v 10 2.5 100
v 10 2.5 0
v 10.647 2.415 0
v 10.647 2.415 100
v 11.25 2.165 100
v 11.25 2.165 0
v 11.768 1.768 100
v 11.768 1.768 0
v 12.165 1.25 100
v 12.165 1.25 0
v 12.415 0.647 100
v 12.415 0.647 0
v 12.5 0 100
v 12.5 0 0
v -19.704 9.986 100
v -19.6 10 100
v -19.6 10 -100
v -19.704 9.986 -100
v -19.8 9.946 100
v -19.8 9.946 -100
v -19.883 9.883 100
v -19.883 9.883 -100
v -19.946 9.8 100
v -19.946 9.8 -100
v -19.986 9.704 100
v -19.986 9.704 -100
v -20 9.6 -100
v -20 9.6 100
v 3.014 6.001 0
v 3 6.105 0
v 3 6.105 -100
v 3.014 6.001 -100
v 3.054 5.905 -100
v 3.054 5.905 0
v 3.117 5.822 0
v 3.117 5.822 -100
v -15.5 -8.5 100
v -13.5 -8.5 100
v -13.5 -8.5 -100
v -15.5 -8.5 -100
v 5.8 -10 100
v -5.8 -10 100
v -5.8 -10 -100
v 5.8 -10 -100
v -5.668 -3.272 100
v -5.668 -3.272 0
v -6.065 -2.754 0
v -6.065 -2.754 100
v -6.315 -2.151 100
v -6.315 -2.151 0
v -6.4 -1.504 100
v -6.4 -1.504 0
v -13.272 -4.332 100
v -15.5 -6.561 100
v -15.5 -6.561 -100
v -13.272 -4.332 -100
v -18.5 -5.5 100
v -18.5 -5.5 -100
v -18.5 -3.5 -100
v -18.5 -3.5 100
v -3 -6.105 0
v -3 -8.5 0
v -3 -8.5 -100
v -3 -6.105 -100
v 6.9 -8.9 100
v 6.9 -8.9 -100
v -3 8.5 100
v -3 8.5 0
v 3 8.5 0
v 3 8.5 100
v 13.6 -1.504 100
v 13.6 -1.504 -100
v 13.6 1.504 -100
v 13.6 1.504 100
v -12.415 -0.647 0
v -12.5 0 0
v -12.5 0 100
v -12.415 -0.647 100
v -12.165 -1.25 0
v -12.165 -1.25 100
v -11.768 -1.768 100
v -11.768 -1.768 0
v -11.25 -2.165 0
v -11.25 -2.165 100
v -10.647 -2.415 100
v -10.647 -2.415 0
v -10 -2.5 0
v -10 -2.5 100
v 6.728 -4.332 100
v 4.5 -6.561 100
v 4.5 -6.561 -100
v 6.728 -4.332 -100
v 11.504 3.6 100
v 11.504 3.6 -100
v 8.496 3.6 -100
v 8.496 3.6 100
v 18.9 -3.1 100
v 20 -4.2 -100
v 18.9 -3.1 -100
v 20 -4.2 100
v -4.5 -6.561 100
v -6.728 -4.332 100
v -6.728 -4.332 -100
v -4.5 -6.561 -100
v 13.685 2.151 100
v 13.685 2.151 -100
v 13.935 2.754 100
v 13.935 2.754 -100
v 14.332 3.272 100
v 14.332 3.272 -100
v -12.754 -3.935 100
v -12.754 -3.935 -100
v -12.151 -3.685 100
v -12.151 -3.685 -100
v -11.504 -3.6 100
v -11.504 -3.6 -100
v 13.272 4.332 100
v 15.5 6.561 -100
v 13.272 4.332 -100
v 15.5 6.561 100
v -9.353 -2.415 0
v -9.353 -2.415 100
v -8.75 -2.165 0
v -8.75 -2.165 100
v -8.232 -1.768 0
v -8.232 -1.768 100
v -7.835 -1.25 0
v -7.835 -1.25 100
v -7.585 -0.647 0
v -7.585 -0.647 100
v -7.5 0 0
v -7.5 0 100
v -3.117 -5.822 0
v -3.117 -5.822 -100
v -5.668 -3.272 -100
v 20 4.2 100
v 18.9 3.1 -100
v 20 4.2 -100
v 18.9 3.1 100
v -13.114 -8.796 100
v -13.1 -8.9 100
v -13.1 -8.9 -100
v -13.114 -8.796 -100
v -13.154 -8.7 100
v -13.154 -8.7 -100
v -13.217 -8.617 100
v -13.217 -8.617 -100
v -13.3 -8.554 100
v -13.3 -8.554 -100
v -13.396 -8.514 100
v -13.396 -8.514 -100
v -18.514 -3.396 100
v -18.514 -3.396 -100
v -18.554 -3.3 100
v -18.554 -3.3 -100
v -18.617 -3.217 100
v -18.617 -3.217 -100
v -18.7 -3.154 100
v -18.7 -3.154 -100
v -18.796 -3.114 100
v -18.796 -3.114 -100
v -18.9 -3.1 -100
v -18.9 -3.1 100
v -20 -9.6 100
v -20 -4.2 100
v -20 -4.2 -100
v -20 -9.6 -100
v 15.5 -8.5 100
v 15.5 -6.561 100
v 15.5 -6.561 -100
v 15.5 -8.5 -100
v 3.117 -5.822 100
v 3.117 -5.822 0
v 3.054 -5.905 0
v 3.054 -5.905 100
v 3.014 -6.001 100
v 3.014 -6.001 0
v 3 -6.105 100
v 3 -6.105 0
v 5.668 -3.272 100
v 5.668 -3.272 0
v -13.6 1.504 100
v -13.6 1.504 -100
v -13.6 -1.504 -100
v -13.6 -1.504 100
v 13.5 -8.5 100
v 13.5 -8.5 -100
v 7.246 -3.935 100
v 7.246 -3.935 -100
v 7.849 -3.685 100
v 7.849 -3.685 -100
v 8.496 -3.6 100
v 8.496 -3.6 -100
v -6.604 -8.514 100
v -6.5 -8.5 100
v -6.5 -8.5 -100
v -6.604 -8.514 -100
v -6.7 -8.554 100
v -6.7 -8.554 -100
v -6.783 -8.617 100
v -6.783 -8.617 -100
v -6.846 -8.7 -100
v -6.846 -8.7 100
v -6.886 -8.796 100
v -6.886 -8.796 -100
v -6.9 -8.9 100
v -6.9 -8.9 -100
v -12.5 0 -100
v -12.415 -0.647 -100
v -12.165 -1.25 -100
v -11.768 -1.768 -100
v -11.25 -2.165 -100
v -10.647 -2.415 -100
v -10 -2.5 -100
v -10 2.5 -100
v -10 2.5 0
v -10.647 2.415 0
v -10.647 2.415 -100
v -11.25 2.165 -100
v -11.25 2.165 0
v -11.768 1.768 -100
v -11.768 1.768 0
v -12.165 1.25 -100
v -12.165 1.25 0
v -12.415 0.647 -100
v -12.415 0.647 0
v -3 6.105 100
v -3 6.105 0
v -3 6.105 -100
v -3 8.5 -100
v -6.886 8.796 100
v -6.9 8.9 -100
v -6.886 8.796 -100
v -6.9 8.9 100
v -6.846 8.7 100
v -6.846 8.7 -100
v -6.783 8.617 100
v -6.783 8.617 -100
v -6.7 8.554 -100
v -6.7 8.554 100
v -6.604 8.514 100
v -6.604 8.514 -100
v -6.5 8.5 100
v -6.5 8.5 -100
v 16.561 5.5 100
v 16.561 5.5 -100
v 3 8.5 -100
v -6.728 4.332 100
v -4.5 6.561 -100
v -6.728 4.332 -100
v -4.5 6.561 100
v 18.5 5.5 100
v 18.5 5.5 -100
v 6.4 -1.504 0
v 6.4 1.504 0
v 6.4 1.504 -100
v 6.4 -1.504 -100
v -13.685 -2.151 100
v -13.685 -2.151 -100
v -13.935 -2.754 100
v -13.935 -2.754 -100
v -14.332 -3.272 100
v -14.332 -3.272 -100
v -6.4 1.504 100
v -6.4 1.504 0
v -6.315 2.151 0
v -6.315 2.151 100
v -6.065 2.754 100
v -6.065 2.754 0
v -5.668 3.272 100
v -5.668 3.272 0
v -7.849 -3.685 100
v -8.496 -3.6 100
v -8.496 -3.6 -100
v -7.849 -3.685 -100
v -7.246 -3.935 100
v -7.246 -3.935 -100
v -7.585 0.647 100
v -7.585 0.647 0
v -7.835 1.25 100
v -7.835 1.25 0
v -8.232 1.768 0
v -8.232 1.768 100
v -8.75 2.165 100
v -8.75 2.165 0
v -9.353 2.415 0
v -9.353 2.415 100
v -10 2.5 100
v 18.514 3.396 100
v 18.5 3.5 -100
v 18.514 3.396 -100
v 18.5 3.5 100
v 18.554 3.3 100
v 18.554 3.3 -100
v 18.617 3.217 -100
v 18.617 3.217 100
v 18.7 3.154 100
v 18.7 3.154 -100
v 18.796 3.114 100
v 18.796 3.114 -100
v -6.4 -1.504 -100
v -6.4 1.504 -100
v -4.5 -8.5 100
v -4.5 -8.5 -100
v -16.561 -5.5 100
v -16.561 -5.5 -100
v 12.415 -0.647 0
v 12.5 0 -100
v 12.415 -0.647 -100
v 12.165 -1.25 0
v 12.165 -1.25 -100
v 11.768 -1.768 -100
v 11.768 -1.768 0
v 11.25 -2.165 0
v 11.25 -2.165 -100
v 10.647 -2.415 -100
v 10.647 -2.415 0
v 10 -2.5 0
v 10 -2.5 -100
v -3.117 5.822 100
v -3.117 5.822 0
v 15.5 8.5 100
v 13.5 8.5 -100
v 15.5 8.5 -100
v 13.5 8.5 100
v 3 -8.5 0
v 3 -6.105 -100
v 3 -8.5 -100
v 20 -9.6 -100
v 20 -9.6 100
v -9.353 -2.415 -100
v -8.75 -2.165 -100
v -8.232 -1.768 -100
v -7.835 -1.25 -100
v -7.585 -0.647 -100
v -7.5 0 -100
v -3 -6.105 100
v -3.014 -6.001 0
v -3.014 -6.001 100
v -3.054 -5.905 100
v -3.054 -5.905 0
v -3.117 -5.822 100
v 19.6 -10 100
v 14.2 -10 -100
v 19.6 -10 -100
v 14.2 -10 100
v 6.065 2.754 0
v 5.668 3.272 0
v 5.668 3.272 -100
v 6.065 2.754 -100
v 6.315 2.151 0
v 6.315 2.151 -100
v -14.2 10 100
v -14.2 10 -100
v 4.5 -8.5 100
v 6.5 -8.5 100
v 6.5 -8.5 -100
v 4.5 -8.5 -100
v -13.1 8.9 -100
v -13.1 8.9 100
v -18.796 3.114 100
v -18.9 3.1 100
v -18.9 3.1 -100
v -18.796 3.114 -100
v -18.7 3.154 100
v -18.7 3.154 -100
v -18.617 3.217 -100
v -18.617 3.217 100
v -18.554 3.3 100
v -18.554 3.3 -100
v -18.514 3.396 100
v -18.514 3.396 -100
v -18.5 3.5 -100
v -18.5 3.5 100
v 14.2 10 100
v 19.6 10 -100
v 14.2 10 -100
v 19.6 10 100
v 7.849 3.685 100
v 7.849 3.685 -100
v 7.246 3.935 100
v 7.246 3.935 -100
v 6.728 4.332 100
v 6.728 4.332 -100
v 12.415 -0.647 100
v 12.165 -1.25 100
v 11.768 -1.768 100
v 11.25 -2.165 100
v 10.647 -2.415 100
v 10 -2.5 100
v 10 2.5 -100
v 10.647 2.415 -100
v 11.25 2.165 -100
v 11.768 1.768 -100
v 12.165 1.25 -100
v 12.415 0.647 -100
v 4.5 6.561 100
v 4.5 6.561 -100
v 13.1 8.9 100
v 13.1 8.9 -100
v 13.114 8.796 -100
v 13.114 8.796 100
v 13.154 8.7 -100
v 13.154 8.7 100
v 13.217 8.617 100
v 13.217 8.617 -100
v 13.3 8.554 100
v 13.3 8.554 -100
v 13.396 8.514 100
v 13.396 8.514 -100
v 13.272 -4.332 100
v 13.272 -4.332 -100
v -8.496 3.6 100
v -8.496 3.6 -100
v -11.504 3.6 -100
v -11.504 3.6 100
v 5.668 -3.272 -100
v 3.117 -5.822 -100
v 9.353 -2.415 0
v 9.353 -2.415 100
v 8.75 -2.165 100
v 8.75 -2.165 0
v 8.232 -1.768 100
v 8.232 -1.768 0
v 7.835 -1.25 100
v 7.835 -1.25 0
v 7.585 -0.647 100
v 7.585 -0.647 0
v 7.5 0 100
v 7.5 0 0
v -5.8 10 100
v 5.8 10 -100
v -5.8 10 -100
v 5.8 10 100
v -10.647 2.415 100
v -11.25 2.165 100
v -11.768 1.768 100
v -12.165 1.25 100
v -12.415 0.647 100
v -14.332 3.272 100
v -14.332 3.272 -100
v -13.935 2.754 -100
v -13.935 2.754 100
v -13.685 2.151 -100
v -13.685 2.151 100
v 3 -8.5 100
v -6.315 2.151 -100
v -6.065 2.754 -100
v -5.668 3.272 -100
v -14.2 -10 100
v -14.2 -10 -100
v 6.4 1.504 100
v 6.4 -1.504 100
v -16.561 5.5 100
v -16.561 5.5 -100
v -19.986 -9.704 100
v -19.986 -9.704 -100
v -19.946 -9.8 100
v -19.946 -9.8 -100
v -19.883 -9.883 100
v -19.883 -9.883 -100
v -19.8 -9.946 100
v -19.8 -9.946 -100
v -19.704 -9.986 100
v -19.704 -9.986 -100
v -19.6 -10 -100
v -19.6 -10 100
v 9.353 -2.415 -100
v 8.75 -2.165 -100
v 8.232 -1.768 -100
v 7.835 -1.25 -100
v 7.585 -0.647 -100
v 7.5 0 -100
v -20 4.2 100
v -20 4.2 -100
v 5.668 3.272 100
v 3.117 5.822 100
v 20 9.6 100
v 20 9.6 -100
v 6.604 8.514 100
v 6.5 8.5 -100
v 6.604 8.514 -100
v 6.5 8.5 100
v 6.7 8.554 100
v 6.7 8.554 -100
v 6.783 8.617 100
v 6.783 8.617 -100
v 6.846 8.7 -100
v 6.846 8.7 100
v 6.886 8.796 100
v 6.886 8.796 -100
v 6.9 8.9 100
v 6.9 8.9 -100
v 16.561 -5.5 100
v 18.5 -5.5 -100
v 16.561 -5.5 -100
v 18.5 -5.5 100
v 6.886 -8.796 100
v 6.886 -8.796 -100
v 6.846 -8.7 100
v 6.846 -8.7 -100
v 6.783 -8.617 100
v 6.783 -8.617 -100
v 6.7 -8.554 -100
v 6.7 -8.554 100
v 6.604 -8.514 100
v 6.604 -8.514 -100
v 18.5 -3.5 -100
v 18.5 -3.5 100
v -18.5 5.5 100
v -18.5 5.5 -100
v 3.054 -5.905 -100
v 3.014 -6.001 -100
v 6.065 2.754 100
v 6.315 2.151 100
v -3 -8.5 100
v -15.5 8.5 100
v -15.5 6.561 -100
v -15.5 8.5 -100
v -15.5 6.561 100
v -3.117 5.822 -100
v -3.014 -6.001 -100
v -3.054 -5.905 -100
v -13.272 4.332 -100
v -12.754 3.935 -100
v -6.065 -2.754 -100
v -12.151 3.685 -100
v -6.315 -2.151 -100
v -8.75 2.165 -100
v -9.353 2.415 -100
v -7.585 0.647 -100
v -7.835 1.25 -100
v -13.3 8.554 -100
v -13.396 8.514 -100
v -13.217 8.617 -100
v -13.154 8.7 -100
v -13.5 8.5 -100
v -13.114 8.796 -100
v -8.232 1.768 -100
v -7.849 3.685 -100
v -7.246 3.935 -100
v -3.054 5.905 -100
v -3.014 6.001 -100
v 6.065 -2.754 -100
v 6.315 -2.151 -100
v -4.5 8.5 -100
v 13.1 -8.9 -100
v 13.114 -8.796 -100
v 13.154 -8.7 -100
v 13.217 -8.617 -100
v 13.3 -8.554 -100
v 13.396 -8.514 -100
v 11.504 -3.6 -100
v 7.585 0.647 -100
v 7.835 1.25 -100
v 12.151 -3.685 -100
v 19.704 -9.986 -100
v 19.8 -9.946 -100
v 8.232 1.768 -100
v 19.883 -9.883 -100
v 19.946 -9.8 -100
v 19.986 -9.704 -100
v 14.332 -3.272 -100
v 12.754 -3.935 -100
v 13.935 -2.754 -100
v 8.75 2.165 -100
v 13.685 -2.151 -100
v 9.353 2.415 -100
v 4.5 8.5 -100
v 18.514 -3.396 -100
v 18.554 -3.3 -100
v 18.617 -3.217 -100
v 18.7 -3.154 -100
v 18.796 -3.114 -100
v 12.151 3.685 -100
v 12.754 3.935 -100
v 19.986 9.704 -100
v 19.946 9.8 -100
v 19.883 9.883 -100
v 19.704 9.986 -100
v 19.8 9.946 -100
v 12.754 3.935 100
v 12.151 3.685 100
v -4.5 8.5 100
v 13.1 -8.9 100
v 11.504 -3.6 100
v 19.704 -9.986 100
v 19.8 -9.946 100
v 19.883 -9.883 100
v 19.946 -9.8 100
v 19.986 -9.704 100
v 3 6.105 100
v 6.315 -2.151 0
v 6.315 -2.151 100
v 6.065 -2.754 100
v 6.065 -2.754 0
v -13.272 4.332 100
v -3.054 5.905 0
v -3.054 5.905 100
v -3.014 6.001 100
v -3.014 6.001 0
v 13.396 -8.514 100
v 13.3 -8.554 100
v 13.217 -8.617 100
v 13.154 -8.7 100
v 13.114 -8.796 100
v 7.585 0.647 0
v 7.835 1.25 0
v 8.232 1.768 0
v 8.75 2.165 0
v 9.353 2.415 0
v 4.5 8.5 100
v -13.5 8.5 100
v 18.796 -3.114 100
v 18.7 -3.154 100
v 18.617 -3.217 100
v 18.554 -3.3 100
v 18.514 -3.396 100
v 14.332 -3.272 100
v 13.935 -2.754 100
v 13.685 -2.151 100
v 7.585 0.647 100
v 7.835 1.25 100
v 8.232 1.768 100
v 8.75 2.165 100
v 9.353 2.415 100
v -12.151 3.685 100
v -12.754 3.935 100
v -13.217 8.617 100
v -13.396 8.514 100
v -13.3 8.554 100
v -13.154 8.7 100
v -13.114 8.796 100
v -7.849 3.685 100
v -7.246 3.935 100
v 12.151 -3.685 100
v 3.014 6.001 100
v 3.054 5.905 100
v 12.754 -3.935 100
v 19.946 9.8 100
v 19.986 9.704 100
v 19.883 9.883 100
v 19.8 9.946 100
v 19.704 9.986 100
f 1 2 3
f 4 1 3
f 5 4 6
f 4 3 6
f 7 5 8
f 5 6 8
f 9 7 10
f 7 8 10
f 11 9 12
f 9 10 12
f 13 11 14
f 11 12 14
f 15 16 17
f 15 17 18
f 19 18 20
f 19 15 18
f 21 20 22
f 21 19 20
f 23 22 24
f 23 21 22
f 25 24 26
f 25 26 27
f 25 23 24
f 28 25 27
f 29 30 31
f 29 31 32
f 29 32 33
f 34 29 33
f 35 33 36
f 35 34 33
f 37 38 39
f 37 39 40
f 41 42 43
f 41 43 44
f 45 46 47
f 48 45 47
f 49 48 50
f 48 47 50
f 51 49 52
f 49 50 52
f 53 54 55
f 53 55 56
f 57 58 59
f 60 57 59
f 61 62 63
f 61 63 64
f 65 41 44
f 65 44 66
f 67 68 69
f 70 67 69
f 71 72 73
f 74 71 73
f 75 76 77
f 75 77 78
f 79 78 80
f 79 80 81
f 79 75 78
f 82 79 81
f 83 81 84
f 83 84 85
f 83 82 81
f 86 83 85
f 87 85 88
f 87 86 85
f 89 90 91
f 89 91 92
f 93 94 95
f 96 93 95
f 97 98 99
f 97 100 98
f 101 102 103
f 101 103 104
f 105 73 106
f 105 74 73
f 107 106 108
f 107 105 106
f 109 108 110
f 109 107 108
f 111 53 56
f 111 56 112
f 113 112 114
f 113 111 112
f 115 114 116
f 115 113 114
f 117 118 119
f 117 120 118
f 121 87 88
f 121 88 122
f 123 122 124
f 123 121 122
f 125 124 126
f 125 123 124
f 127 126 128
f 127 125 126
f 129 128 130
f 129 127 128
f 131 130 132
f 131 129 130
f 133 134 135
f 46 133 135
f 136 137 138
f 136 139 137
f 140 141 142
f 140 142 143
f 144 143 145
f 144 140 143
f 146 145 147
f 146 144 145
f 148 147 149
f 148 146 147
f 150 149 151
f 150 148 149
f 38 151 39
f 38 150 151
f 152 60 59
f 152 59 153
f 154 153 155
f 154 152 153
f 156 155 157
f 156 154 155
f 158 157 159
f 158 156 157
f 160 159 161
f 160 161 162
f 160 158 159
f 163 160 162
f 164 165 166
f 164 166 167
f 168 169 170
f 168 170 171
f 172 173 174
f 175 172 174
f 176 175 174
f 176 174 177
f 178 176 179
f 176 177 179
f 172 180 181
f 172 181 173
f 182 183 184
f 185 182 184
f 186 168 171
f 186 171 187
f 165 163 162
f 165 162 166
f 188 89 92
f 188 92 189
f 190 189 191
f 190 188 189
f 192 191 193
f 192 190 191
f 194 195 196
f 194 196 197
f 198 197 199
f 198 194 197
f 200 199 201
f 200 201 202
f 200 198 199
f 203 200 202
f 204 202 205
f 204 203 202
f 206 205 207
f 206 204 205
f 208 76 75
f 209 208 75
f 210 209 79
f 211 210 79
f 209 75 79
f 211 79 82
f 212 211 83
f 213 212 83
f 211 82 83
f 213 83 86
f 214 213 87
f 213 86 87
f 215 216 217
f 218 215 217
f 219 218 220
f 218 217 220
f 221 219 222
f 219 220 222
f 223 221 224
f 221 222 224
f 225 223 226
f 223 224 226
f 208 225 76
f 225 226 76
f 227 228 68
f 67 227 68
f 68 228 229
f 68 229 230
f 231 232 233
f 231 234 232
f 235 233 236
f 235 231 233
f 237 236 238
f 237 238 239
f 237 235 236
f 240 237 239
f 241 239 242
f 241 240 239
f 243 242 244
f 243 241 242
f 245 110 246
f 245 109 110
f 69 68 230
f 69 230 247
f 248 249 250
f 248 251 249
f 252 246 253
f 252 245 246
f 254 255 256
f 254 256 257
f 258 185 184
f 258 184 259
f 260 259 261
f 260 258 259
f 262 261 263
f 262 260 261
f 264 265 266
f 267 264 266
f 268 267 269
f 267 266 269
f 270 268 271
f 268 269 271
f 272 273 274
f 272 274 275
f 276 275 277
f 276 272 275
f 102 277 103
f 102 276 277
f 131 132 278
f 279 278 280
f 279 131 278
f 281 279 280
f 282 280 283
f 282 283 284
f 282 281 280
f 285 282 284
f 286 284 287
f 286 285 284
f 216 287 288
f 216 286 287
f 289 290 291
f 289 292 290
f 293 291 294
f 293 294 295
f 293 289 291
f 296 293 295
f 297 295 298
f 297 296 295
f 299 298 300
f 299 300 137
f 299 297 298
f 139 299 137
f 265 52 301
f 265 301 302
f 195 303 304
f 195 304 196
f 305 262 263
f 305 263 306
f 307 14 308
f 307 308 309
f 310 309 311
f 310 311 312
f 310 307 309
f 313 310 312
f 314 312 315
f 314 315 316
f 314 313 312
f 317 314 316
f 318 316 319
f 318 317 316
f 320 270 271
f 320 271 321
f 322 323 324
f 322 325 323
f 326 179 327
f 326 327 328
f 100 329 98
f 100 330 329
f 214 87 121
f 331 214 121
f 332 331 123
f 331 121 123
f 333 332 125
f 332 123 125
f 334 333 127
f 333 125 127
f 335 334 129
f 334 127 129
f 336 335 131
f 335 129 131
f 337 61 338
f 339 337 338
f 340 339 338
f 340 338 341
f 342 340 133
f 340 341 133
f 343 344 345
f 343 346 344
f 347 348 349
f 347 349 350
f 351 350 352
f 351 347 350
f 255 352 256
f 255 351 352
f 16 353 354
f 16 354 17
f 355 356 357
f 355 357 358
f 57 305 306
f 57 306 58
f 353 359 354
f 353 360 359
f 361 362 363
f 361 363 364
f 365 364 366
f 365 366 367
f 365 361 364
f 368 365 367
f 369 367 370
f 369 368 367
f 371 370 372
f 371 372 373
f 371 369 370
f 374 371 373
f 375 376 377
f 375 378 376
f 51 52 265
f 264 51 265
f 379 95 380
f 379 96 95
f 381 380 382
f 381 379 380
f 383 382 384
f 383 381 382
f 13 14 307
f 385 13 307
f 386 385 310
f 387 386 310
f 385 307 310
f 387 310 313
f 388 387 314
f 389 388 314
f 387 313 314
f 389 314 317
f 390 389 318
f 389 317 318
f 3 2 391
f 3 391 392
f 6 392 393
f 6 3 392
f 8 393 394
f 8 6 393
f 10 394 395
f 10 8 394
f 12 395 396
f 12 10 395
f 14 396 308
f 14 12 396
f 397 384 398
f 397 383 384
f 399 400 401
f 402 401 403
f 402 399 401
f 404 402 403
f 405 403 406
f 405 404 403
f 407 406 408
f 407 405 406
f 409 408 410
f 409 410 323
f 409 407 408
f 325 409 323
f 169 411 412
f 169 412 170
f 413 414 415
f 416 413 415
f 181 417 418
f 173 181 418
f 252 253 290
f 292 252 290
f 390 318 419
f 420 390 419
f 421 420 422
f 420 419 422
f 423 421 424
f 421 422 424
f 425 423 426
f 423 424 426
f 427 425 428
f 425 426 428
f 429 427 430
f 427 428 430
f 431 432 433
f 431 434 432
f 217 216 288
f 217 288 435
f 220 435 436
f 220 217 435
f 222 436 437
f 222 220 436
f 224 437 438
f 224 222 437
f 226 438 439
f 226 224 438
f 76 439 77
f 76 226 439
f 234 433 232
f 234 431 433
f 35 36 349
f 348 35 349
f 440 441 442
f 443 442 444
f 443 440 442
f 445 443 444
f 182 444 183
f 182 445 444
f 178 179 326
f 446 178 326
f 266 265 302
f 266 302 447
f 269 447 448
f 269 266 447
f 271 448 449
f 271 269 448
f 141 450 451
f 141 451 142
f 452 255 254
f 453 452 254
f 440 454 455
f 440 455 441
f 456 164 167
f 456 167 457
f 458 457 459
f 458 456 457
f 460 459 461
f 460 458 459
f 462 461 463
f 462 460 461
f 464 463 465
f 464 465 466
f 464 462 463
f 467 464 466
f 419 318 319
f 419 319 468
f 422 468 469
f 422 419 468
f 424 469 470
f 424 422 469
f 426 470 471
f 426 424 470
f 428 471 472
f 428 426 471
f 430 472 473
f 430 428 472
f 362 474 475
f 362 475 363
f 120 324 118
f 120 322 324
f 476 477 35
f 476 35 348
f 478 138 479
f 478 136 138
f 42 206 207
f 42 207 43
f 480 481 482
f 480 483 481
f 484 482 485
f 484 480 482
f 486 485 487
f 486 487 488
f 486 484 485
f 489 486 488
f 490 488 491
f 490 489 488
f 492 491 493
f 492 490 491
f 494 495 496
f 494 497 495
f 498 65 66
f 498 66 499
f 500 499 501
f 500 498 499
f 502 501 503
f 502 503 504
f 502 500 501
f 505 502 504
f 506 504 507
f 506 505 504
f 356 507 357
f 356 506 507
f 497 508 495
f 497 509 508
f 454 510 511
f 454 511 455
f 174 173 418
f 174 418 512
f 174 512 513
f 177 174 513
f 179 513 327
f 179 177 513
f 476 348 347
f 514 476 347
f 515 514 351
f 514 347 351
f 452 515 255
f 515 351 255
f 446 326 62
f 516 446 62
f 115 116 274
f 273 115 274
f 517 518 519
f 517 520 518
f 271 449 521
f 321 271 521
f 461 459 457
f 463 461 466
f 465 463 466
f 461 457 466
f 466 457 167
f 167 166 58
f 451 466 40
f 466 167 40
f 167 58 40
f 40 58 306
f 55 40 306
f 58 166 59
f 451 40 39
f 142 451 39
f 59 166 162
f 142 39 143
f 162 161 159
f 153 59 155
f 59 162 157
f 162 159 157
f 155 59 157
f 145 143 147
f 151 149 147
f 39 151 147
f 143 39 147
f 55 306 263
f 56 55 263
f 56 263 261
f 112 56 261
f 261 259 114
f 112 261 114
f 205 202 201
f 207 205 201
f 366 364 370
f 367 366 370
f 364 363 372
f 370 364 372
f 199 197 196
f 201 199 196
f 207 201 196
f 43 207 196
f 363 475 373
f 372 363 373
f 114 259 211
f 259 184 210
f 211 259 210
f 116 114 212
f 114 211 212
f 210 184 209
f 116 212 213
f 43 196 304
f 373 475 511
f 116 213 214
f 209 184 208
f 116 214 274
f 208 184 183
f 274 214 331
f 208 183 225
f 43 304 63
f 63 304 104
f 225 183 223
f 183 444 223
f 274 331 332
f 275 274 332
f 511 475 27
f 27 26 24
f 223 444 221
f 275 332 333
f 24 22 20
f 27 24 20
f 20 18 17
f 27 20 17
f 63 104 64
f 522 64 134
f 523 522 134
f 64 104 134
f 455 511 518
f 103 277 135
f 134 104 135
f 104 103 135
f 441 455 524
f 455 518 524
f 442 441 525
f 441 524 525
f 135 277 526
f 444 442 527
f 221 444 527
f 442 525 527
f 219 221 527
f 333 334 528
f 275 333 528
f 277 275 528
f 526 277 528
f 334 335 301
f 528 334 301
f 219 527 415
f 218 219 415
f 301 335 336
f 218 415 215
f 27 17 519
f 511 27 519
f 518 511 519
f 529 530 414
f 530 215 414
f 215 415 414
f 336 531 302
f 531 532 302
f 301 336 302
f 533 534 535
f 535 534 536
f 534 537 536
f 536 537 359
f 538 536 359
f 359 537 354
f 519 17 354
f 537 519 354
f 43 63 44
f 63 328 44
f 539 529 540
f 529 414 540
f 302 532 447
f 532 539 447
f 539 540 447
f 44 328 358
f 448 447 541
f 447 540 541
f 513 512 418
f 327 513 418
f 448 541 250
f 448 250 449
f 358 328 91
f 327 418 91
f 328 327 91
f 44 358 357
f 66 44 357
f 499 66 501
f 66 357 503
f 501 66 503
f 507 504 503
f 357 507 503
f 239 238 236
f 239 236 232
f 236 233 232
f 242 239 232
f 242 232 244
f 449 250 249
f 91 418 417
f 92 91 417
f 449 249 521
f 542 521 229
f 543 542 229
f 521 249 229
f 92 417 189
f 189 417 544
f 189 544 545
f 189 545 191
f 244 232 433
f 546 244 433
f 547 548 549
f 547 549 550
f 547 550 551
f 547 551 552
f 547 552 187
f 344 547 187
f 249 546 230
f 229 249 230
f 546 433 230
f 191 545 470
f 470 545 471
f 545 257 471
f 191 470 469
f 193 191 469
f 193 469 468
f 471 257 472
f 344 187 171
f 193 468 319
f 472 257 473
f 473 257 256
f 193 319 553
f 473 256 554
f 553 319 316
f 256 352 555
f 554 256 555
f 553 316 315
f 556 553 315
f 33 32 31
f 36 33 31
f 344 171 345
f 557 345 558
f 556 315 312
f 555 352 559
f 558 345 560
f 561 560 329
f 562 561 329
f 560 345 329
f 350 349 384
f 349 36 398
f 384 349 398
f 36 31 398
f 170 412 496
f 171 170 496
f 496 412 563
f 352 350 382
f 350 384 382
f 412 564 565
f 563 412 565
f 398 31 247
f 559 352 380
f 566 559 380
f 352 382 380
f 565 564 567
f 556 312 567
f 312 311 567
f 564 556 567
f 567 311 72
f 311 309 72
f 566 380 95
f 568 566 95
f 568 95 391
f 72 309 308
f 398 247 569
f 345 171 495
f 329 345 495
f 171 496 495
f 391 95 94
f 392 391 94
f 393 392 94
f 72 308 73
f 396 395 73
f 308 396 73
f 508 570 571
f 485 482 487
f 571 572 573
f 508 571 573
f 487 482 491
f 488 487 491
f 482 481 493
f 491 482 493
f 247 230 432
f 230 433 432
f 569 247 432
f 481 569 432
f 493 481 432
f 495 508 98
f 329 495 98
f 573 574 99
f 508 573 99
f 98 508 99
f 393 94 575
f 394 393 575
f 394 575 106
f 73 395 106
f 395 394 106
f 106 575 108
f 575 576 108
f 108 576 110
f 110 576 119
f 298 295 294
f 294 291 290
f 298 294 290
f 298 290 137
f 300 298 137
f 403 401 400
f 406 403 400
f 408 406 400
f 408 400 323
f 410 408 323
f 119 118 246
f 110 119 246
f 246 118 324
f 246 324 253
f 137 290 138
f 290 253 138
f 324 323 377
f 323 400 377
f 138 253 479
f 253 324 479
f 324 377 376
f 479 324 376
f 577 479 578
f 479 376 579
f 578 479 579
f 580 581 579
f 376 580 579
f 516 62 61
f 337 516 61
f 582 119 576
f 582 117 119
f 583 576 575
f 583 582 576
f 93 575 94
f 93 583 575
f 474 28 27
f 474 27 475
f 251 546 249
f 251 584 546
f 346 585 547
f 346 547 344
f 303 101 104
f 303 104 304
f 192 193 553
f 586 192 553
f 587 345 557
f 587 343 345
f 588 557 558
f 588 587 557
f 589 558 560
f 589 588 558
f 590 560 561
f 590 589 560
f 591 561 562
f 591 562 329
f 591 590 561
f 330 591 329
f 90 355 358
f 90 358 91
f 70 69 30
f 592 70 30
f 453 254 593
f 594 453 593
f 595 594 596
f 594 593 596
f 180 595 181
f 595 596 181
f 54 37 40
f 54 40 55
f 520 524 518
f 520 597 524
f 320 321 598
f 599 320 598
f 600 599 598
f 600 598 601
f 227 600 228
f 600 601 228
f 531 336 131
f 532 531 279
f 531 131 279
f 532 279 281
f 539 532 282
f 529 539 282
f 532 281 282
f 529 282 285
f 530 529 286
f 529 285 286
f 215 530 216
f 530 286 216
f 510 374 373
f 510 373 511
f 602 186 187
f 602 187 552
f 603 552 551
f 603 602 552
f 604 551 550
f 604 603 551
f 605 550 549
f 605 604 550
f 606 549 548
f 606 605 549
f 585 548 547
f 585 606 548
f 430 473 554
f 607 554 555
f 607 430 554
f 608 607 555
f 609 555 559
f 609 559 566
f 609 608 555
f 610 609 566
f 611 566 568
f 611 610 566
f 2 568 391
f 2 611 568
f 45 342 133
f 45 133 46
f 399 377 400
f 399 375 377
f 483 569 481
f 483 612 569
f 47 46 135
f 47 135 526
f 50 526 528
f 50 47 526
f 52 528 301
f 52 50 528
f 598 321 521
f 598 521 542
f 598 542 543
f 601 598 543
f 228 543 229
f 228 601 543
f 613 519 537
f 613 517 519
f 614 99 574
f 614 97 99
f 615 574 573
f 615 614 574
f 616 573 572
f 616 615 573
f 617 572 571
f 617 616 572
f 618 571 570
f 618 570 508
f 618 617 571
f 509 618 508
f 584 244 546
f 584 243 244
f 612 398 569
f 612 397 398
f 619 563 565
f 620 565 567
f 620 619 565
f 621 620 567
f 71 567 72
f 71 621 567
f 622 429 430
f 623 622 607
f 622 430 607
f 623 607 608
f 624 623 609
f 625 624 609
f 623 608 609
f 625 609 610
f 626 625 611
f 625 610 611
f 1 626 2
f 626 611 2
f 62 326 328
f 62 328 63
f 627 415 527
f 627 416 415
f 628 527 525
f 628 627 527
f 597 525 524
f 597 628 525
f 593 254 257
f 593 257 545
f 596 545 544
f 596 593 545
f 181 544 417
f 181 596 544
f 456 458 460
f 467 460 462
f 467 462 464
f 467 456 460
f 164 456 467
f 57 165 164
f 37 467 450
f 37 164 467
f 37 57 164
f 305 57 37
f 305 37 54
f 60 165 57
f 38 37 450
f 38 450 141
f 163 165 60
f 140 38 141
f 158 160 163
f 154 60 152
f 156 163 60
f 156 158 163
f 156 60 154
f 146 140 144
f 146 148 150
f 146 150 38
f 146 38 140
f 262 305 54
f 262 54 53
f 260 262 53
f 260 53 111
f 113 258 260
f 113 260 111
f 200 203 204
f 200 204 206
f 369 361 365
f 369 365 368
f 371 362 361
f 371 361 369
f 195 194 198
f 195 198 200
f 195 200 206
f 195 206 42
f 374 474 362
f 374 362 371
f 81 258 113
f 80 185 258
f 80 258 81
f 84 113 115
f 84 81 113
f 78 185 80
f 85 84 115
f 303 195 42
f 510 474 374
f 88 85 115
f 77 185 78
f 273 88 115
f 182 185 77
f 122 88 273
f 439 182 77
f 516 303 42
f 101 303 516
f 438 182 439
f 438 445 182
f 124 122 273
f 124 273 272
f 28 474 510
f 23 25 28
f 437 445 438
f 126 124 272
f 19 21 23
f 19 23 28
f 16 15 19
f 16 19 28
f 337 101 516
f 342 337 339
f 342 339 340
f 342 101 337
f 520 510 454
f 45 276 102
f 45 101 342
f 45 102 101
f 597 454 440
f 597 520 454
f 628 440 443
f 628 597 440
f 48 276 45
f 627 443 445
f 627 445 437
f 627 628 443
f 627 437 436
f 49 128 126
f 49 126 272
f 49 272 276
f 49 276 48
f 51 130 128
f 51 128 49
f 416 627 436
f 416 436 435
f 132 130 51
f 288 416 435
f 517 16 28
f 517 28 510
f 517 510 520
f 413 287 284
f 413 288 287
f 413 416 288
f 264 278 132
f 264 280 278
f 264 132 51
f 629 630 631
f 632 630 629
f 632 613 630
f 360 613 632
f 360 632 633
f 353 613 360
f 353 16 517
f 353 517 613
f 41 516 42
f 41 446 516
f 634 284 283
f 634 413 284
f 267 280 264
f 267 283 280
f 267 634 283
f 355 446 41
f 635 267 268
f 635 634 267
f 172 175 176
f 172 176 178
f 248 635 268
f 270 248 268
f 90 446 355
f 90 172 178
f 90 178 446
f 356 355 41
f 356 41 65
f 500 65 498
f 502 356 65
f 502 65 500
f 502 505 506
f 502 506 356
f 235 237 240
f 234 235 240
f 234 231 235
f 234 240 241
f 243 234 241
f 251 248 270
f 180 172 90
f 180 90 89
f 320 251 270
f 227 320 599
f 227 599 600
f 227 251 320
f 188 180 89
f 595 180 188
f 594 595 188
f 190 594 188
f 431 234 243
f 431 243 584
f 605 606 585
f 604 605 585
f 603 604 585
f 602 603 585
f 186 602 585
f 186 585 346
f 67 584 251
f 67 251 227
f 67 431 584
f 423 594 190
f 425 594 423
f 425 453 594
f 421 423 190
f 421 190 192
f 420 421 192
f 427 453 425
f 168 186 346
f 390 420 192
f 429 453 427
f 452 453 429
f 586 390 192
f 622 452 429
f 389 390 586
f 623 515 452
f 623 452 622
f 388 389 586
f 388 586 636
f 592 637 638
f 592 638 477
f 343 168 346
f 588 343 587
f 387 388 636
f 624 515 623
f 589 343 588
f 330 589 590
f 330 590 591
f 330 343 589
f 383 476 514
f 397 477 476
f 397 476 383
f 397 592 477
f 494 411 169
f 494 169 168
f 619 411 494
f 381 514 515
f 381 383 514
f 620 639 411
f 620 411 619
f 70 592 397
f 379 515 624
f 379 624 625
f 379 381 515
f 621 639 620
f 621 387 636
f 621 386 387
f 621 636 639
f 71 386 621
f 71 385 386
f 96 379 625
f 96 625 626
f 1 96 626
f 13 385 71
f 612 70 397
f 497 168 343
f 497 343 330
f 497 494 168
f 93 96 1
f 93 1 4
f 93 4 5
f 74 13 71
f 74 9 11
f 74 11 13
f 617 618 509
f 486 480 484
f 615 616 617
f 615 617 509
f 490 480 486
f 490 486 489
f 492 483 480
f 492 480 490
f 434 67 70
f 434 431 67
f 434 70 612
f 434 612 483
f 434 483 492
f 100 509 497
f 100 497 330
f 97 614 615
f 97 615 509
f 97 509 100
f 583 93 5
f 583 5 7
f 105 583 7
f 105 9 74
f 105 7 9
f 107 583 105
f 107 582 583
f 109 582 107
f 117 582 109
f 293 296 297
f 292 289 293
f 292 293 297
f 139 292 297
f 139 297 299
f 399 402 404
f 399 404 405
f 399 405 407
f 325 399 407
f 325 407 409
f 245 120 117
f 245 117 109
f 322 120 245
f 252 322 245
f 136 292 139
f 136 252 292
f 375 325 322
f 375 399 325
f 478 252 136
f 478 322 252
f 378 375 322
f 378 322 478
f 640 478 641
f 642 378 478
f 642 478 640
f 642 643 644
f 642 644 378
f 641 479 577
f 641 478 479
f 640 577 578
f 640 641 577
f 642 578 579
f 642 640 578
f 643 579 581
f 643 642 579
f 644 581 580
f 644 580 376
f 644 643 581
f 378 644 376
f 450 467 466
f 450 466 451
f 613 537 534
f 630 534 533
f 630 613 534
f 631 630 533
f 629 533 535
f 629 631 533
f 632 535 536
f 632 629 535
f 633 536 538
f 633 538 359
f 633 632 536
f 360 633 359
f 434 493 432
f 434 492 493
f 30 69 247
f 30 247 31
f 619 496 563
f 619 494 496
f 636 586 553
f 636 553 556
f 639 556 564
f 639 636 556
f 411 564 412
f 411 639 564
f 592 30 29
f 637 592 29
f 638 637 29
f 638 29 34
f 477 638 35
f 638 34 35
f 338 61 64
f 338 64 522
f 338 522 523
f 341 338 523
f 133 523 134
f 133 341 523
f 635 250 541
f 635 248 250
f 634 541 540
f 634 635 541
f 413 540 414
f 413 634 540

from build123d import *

# Parameters (mm, degrees)
RESSALTO_EXTRUS_O1_DEPTH = 100


with BuildPart() as part:
    # Esboço1 → Ressalto-extrusão1 (new body, symmetric)
    with BuildSketch(Plane.XY):
        with BuildLine():
            Line((-13.1, 8.9), (-14.2, 10))
            Line((-14.2, 10), (-19.6, 10))
            ThreePointArc((-19.6, 10), (-19.882842712, 9.882842712), (-20, 9.6))
            Line((-20, 9.6), (-20, 4.2))
            Line((-20, 4.2), (-18.9, 3.1))
            ThreePointArc((-18.9, 3.1), (-18.617157287, 3.217157287), (-18.5, 3.5))
            Line((-18.5, 3.5), (-18.5, 5.5))
            Line((-18.5, 5.5), (-16.560660172, 5.5))
            Line((-16.560660172, 5.5), (-14.332233047, 3.271572875))
            ThreePointArc((-14.332233047, 3.271572875), (-13.790301169, 2.460514503), (-13.6, 1.503805922))
            Line((-13.6, 1.503805922), (-13.6, 0))
            Line((-13.6, 0), (-13.6, -1.503805922))
            ThreePointArc((-13.6, -1.503805922), (-13.790301169, -2.460514503), (-14.332233047, -3.271572875))
            Line((-14.332233047, -3.271572875), (-16.560660172, -5.5))
            Line((-16.560660172, -5.5), (-18.5, -5.5))
            Line((-18.5, -5.5), (-18.5, -3.5))
            ThreePointArc((-18.5, -3.5), (-18.617157287, -3.217157288), (-18.9, -3.1))
            Line((-18.9, -3.1), (-20, -4.2))
            Line((-20, -4.2), (-20, -9.6))
            ThreePointArc((-20, -9.6), (-19.882842712, -9.882842712), (-19.6, -10))
            Line((-19.6, -10), (-14.2, -10))
            Line((-14.2, -10), (-13.1, -8.9))
            ThreePointArc((-13.1, -8.9), (-13.217157287, -8.617157288), (-13.5, -8.5))
            Line((-13.5, -8.5), (-15.5, -8.5))
            Line((-15.5, -8.5), (-15.5, -6.560660172))
            Line((-15.5, -6.560660172), (-13.271572875, -4.332233047))
            ThreePointArc((-13.271572875, -4.332233047), (-12.460514503, -3.790301169), (-11.503805922, -3.6))
            Line((-11.503805922, -3.6), (-10, -3.6))
            Line((-10, -3.6), (-8.496194078, -3.6))
            ThreePointArc((-8.496194078, -3.6), (-7.539485497, -3.790301169), (-6.728427125, -4.332233047))
            Line((-6.728427125, -4.332233047), (-4.5, -6.560660172))
            Line((-4.5, -6.560660172), (-4.5, -8.5))
            Line((-4.5, -8.5), (-6.5, -8.5))
            ThreePointArc((-6.5, -8.5), (-6.782842712, -8.617157288), (-6.9, -8.9))
            Line((-6.9, -8.9), (-5.8, -10))
            Line((-5.8, -10), (5.8, -10))
            Line((5.8, -10), (6.9, -8.9))
            ThreePointArc((6.9, -8.9), (6.782842712, -8.617157288), (6.5, -8.5))
            Line((6.5, -8.5), (4.5, -8.5))
            Line((4.5, -8.5), (4.5, -6.560660172))
            Line((4.5, -6.560660172), (6.728427125, -4.332233047))
            ThreePointArc((6.728427125, -4.332233047), (7.539485497, -3.790301169), (8.496194078, -3.6))
            Line((8.496194078, -3.6), (10, -3.6))
            Line((10, -3.6), (11.503805922, -3.6))
            ThreePointArc((11.503805922, -3.6), (12.460514503, -3.790301169), (13.271572875, -4.332233047))
            Line((13.271572875, -4.332233047), (15.5, -6.560660172))
            Line((15.5, -6.560660172), (15.5, -8.5))
            Line((15.5, -8.5), (13.5, -8.5))
            ThreePointArc((13.5, -8.5), (13.217157287, -8.617157288), (13.1, -8.9))
            Line((13.1, -8.9), (14.2, -10))
            Line((14.2, -10), (19.6, -10))
            ThreePointArc((19.6, -10), (19.882842712, -9.882842712), (20, -9.6))
            Line((20, -9.6), (20, -4.2))
            Line((20, -4.2), (18.9, -3.1))
            ThreePointArc((18.9, -3.1), (18.617157287, -3.217157288), (18.5, -3.5))
            Line((18.5, -3.5), (18.5, -5.5))
            Line((18.5, -5.5), (16.560660172, -5.5))
            Line((16.560660172, -5.5), (14.332233047, -3.271572875))
            ThreePointArc((14.332233047, -3.271572875), (13.790301169, -2.460514503), (13.6, -1.503805922))
            Line((13.6, -1.503805922), (13.6, 0))
            Line((13.6, 0), (13.6, 1.503805922))
            ThreePointArc((13.6, 1.503805922), (13.790301169, 2.460514503), (14.332233047, 3.271572875))
            Line((14.332233047, 3.271572875), (16.560660172, 5.5))
            Line((16.560660172, 5.5), (18.5, 5.5))
            Line((18.5, 5.5), (18.5, 3.5))
            ThreePointArc((18.5, 3.5), (18.617157287, 3.217157287), (18.9, 3.1))
            Line((18.9, 3.1), (20, 4.2))
            Line((20, 4.2), (20, 9.6))
            ThreePointArc((20, 9.6), (19.882842712, 9.882842712), (19.6, 10))
            Line((19.6, 10), (14.2, 10))
            Line((14.2, 10), (13.1, 8.9))
            ThreePointArc((13.1, 8.9), (13.217157287, 8.617157287), (13.5, 8.5))
            Line((13.5, 8.5), (15.5, 8.5))
            Line((15.5, 8.5), (15.5, 6.560660172))
            Line((15.5, 6.560660172), (13.271572875, 4.332233047))
            ThreePointArc((13.271572875, 4.332233047), (12.460514503, 3.790301169), (11.503805922, 3.6))
            Line((11.503805922, 3.6), (10, 3.6))
            Line((10, 3.6), (8.496194078, 3.6))
            ThreePointArc((8.496194078, 3.6), (7.539485497, 3.790301169), (6.728427125, 4.332233047))
            Line((6.728427125, 4.332233047), (4.5, 6.560660172))
            Line((4.5, 6.560660172), (4.5, 8.5))
            Line((4.5, 8.5), (6.5, 8.5))
            ThreePointArc((6.5, 8.5), (6.782842712, 8.617157288), (6.9, 8.9))
            Line((6.9, 8.9), (5.8, 10))
            Line((5.8, 10), (-5.8, 10))
            Line((-5.8, 10), (-6.9, 8.9))
            ThreePointArc((-6.9, 8.9), (-6.782842712, 8.617157288), (-6.5, 8.5))
            Line((-6.5, 8.5), (-4.5, 8.5))
            Line((-4.5, 8.5), (-4.5, 6.560660172))
            Line((-4.5, 6.560660172), (-6.728427125, 4.332233047))
            ThreePointArc((-6.728427125, 4.332233047), (-7.539485497, 3.790301169), (-8.496194078, 3.6))
            Line((-8.496194078, 3.6), (-10, 3.6))
            Line((-10, 3.6), (-11.503805922, 3.6))
            ThreePointArc((-11.503805922, 3.6), (-12.460514503, 3.790301169), (-13.271572875, 4.332233047))
            Line((-13.271572875, 4.332233047), (-15.5, 6.560660172))
            Line((-15.5, 6.560660172), (-15.5, 8.5))
            Line((-15.5, 8.5), (-13.5, 8.5))
            ThreePointArc((-13.5, 8.5), (-13.217157287, 8.617157287), (-13.1, 8.9))
        make_face()
        with BuildLine():
            Line((-3, 8.5), (3, 8.5))
            Line((3, 8.5), (3, 6.105025253))
            ThreePointArc((3, 6.105025253), (3.030448187, 5.95195188), (3.117157288, 5.822182541))
            Line((3.117157288, 5.822182541), (5.667766953, 3.271572875))
            ThreePointArc((5.667766953, 3.271572875), (6.209698831, 2.460514503), (6.4, 1.503805922))
            Line((6.4, 1.503805922), (6.4, 0))
            Line((6.4, 0), (6.4, -1.503805922))
            ThreePointArc((6.4, -1.503805922), (6.209698831, -2.460514503), (5.667766953, -3.271572875))
            Line((5.667766953, -3.271572875), (3.117157288, -5.822182541))
            ThreePointArc((3.117157288, -5.822182541), (3.030448187, -5.95195188), (3, -6.105025253))
            Line((3, -6.105025253), (3, -8.5))
            Line((3, -8.5), (-3, -8.5))
            Line((-3, -8.5), (-3, -6.105025253))
            ThreePointArc((-3, -6.105025253), (-3.030448187, -5.95195188), (-3.117157288, -5.822182541))
            Line((-3.117157288, -5.822182541), (-5.667766953, -3.271572875))
            ThreePointArc((-5.667766953, -3.271572875), (-6.209698831, -2.460514503), (-6.4, -1.503805922))
            Line((-6.4, -1.503805922), (-6.4, 0))
            Line((-6.4, 0), (-6.4, 1.503805922))
            ThreePointArc((-6.4, 1.503805922), (-6.209698831, 2.460514503), (-5.667766953, 3.271572875))
            Line((-5.667766953, 3.271572875), (-3.117157288, 5.822182541))
            ThreePointArc((-3.117157288, 5.822182541), (-3.030448187, 5.95195188), (-3, 6.105025253))
            Line((-3, 6.105025253), (-3, 8.5))
        make_face(mode=Mode.SUBTRACT)
        with BuildLine():
            ThreePointArc((-10, 2.5), (-11.767766953, 1.767766953), (-12.5, 0))
            ThreePointArc((-12.5, 0), (-11.767766953, -1.767766953), (-10, -2.5))
            ThreePointArc((-10, -2.5), (-8.232233047, -1.767766953), (-7.5, 0))
            ThreePointArc((-7.5, 0), (-8.232233047, 1.767766953), (-10, 2.5))
        make_face(mode=Mode.SUBTRACT)
        with BuildLine():
            ThreePointArc((12.5, 0), (11.767766953, -1.767766953), (10, -2.5))
            ThreePointArc((10, -2.5), (8.232233047, -1.767766953), (7.5, 0))
            ThreePointArc((7.5, 0), (8.232233047, 1.767766953), (10, 2.5))
            ThreePointArc((10, 2.5), (11.767766953, 1.767766953), (12.5, 0))
        make_face(mode=Mode.SUBTRACT)
    extrude(amount=RESSALTO_EXTRUS_O1_DEPTH, both=True)


solid = part.part
